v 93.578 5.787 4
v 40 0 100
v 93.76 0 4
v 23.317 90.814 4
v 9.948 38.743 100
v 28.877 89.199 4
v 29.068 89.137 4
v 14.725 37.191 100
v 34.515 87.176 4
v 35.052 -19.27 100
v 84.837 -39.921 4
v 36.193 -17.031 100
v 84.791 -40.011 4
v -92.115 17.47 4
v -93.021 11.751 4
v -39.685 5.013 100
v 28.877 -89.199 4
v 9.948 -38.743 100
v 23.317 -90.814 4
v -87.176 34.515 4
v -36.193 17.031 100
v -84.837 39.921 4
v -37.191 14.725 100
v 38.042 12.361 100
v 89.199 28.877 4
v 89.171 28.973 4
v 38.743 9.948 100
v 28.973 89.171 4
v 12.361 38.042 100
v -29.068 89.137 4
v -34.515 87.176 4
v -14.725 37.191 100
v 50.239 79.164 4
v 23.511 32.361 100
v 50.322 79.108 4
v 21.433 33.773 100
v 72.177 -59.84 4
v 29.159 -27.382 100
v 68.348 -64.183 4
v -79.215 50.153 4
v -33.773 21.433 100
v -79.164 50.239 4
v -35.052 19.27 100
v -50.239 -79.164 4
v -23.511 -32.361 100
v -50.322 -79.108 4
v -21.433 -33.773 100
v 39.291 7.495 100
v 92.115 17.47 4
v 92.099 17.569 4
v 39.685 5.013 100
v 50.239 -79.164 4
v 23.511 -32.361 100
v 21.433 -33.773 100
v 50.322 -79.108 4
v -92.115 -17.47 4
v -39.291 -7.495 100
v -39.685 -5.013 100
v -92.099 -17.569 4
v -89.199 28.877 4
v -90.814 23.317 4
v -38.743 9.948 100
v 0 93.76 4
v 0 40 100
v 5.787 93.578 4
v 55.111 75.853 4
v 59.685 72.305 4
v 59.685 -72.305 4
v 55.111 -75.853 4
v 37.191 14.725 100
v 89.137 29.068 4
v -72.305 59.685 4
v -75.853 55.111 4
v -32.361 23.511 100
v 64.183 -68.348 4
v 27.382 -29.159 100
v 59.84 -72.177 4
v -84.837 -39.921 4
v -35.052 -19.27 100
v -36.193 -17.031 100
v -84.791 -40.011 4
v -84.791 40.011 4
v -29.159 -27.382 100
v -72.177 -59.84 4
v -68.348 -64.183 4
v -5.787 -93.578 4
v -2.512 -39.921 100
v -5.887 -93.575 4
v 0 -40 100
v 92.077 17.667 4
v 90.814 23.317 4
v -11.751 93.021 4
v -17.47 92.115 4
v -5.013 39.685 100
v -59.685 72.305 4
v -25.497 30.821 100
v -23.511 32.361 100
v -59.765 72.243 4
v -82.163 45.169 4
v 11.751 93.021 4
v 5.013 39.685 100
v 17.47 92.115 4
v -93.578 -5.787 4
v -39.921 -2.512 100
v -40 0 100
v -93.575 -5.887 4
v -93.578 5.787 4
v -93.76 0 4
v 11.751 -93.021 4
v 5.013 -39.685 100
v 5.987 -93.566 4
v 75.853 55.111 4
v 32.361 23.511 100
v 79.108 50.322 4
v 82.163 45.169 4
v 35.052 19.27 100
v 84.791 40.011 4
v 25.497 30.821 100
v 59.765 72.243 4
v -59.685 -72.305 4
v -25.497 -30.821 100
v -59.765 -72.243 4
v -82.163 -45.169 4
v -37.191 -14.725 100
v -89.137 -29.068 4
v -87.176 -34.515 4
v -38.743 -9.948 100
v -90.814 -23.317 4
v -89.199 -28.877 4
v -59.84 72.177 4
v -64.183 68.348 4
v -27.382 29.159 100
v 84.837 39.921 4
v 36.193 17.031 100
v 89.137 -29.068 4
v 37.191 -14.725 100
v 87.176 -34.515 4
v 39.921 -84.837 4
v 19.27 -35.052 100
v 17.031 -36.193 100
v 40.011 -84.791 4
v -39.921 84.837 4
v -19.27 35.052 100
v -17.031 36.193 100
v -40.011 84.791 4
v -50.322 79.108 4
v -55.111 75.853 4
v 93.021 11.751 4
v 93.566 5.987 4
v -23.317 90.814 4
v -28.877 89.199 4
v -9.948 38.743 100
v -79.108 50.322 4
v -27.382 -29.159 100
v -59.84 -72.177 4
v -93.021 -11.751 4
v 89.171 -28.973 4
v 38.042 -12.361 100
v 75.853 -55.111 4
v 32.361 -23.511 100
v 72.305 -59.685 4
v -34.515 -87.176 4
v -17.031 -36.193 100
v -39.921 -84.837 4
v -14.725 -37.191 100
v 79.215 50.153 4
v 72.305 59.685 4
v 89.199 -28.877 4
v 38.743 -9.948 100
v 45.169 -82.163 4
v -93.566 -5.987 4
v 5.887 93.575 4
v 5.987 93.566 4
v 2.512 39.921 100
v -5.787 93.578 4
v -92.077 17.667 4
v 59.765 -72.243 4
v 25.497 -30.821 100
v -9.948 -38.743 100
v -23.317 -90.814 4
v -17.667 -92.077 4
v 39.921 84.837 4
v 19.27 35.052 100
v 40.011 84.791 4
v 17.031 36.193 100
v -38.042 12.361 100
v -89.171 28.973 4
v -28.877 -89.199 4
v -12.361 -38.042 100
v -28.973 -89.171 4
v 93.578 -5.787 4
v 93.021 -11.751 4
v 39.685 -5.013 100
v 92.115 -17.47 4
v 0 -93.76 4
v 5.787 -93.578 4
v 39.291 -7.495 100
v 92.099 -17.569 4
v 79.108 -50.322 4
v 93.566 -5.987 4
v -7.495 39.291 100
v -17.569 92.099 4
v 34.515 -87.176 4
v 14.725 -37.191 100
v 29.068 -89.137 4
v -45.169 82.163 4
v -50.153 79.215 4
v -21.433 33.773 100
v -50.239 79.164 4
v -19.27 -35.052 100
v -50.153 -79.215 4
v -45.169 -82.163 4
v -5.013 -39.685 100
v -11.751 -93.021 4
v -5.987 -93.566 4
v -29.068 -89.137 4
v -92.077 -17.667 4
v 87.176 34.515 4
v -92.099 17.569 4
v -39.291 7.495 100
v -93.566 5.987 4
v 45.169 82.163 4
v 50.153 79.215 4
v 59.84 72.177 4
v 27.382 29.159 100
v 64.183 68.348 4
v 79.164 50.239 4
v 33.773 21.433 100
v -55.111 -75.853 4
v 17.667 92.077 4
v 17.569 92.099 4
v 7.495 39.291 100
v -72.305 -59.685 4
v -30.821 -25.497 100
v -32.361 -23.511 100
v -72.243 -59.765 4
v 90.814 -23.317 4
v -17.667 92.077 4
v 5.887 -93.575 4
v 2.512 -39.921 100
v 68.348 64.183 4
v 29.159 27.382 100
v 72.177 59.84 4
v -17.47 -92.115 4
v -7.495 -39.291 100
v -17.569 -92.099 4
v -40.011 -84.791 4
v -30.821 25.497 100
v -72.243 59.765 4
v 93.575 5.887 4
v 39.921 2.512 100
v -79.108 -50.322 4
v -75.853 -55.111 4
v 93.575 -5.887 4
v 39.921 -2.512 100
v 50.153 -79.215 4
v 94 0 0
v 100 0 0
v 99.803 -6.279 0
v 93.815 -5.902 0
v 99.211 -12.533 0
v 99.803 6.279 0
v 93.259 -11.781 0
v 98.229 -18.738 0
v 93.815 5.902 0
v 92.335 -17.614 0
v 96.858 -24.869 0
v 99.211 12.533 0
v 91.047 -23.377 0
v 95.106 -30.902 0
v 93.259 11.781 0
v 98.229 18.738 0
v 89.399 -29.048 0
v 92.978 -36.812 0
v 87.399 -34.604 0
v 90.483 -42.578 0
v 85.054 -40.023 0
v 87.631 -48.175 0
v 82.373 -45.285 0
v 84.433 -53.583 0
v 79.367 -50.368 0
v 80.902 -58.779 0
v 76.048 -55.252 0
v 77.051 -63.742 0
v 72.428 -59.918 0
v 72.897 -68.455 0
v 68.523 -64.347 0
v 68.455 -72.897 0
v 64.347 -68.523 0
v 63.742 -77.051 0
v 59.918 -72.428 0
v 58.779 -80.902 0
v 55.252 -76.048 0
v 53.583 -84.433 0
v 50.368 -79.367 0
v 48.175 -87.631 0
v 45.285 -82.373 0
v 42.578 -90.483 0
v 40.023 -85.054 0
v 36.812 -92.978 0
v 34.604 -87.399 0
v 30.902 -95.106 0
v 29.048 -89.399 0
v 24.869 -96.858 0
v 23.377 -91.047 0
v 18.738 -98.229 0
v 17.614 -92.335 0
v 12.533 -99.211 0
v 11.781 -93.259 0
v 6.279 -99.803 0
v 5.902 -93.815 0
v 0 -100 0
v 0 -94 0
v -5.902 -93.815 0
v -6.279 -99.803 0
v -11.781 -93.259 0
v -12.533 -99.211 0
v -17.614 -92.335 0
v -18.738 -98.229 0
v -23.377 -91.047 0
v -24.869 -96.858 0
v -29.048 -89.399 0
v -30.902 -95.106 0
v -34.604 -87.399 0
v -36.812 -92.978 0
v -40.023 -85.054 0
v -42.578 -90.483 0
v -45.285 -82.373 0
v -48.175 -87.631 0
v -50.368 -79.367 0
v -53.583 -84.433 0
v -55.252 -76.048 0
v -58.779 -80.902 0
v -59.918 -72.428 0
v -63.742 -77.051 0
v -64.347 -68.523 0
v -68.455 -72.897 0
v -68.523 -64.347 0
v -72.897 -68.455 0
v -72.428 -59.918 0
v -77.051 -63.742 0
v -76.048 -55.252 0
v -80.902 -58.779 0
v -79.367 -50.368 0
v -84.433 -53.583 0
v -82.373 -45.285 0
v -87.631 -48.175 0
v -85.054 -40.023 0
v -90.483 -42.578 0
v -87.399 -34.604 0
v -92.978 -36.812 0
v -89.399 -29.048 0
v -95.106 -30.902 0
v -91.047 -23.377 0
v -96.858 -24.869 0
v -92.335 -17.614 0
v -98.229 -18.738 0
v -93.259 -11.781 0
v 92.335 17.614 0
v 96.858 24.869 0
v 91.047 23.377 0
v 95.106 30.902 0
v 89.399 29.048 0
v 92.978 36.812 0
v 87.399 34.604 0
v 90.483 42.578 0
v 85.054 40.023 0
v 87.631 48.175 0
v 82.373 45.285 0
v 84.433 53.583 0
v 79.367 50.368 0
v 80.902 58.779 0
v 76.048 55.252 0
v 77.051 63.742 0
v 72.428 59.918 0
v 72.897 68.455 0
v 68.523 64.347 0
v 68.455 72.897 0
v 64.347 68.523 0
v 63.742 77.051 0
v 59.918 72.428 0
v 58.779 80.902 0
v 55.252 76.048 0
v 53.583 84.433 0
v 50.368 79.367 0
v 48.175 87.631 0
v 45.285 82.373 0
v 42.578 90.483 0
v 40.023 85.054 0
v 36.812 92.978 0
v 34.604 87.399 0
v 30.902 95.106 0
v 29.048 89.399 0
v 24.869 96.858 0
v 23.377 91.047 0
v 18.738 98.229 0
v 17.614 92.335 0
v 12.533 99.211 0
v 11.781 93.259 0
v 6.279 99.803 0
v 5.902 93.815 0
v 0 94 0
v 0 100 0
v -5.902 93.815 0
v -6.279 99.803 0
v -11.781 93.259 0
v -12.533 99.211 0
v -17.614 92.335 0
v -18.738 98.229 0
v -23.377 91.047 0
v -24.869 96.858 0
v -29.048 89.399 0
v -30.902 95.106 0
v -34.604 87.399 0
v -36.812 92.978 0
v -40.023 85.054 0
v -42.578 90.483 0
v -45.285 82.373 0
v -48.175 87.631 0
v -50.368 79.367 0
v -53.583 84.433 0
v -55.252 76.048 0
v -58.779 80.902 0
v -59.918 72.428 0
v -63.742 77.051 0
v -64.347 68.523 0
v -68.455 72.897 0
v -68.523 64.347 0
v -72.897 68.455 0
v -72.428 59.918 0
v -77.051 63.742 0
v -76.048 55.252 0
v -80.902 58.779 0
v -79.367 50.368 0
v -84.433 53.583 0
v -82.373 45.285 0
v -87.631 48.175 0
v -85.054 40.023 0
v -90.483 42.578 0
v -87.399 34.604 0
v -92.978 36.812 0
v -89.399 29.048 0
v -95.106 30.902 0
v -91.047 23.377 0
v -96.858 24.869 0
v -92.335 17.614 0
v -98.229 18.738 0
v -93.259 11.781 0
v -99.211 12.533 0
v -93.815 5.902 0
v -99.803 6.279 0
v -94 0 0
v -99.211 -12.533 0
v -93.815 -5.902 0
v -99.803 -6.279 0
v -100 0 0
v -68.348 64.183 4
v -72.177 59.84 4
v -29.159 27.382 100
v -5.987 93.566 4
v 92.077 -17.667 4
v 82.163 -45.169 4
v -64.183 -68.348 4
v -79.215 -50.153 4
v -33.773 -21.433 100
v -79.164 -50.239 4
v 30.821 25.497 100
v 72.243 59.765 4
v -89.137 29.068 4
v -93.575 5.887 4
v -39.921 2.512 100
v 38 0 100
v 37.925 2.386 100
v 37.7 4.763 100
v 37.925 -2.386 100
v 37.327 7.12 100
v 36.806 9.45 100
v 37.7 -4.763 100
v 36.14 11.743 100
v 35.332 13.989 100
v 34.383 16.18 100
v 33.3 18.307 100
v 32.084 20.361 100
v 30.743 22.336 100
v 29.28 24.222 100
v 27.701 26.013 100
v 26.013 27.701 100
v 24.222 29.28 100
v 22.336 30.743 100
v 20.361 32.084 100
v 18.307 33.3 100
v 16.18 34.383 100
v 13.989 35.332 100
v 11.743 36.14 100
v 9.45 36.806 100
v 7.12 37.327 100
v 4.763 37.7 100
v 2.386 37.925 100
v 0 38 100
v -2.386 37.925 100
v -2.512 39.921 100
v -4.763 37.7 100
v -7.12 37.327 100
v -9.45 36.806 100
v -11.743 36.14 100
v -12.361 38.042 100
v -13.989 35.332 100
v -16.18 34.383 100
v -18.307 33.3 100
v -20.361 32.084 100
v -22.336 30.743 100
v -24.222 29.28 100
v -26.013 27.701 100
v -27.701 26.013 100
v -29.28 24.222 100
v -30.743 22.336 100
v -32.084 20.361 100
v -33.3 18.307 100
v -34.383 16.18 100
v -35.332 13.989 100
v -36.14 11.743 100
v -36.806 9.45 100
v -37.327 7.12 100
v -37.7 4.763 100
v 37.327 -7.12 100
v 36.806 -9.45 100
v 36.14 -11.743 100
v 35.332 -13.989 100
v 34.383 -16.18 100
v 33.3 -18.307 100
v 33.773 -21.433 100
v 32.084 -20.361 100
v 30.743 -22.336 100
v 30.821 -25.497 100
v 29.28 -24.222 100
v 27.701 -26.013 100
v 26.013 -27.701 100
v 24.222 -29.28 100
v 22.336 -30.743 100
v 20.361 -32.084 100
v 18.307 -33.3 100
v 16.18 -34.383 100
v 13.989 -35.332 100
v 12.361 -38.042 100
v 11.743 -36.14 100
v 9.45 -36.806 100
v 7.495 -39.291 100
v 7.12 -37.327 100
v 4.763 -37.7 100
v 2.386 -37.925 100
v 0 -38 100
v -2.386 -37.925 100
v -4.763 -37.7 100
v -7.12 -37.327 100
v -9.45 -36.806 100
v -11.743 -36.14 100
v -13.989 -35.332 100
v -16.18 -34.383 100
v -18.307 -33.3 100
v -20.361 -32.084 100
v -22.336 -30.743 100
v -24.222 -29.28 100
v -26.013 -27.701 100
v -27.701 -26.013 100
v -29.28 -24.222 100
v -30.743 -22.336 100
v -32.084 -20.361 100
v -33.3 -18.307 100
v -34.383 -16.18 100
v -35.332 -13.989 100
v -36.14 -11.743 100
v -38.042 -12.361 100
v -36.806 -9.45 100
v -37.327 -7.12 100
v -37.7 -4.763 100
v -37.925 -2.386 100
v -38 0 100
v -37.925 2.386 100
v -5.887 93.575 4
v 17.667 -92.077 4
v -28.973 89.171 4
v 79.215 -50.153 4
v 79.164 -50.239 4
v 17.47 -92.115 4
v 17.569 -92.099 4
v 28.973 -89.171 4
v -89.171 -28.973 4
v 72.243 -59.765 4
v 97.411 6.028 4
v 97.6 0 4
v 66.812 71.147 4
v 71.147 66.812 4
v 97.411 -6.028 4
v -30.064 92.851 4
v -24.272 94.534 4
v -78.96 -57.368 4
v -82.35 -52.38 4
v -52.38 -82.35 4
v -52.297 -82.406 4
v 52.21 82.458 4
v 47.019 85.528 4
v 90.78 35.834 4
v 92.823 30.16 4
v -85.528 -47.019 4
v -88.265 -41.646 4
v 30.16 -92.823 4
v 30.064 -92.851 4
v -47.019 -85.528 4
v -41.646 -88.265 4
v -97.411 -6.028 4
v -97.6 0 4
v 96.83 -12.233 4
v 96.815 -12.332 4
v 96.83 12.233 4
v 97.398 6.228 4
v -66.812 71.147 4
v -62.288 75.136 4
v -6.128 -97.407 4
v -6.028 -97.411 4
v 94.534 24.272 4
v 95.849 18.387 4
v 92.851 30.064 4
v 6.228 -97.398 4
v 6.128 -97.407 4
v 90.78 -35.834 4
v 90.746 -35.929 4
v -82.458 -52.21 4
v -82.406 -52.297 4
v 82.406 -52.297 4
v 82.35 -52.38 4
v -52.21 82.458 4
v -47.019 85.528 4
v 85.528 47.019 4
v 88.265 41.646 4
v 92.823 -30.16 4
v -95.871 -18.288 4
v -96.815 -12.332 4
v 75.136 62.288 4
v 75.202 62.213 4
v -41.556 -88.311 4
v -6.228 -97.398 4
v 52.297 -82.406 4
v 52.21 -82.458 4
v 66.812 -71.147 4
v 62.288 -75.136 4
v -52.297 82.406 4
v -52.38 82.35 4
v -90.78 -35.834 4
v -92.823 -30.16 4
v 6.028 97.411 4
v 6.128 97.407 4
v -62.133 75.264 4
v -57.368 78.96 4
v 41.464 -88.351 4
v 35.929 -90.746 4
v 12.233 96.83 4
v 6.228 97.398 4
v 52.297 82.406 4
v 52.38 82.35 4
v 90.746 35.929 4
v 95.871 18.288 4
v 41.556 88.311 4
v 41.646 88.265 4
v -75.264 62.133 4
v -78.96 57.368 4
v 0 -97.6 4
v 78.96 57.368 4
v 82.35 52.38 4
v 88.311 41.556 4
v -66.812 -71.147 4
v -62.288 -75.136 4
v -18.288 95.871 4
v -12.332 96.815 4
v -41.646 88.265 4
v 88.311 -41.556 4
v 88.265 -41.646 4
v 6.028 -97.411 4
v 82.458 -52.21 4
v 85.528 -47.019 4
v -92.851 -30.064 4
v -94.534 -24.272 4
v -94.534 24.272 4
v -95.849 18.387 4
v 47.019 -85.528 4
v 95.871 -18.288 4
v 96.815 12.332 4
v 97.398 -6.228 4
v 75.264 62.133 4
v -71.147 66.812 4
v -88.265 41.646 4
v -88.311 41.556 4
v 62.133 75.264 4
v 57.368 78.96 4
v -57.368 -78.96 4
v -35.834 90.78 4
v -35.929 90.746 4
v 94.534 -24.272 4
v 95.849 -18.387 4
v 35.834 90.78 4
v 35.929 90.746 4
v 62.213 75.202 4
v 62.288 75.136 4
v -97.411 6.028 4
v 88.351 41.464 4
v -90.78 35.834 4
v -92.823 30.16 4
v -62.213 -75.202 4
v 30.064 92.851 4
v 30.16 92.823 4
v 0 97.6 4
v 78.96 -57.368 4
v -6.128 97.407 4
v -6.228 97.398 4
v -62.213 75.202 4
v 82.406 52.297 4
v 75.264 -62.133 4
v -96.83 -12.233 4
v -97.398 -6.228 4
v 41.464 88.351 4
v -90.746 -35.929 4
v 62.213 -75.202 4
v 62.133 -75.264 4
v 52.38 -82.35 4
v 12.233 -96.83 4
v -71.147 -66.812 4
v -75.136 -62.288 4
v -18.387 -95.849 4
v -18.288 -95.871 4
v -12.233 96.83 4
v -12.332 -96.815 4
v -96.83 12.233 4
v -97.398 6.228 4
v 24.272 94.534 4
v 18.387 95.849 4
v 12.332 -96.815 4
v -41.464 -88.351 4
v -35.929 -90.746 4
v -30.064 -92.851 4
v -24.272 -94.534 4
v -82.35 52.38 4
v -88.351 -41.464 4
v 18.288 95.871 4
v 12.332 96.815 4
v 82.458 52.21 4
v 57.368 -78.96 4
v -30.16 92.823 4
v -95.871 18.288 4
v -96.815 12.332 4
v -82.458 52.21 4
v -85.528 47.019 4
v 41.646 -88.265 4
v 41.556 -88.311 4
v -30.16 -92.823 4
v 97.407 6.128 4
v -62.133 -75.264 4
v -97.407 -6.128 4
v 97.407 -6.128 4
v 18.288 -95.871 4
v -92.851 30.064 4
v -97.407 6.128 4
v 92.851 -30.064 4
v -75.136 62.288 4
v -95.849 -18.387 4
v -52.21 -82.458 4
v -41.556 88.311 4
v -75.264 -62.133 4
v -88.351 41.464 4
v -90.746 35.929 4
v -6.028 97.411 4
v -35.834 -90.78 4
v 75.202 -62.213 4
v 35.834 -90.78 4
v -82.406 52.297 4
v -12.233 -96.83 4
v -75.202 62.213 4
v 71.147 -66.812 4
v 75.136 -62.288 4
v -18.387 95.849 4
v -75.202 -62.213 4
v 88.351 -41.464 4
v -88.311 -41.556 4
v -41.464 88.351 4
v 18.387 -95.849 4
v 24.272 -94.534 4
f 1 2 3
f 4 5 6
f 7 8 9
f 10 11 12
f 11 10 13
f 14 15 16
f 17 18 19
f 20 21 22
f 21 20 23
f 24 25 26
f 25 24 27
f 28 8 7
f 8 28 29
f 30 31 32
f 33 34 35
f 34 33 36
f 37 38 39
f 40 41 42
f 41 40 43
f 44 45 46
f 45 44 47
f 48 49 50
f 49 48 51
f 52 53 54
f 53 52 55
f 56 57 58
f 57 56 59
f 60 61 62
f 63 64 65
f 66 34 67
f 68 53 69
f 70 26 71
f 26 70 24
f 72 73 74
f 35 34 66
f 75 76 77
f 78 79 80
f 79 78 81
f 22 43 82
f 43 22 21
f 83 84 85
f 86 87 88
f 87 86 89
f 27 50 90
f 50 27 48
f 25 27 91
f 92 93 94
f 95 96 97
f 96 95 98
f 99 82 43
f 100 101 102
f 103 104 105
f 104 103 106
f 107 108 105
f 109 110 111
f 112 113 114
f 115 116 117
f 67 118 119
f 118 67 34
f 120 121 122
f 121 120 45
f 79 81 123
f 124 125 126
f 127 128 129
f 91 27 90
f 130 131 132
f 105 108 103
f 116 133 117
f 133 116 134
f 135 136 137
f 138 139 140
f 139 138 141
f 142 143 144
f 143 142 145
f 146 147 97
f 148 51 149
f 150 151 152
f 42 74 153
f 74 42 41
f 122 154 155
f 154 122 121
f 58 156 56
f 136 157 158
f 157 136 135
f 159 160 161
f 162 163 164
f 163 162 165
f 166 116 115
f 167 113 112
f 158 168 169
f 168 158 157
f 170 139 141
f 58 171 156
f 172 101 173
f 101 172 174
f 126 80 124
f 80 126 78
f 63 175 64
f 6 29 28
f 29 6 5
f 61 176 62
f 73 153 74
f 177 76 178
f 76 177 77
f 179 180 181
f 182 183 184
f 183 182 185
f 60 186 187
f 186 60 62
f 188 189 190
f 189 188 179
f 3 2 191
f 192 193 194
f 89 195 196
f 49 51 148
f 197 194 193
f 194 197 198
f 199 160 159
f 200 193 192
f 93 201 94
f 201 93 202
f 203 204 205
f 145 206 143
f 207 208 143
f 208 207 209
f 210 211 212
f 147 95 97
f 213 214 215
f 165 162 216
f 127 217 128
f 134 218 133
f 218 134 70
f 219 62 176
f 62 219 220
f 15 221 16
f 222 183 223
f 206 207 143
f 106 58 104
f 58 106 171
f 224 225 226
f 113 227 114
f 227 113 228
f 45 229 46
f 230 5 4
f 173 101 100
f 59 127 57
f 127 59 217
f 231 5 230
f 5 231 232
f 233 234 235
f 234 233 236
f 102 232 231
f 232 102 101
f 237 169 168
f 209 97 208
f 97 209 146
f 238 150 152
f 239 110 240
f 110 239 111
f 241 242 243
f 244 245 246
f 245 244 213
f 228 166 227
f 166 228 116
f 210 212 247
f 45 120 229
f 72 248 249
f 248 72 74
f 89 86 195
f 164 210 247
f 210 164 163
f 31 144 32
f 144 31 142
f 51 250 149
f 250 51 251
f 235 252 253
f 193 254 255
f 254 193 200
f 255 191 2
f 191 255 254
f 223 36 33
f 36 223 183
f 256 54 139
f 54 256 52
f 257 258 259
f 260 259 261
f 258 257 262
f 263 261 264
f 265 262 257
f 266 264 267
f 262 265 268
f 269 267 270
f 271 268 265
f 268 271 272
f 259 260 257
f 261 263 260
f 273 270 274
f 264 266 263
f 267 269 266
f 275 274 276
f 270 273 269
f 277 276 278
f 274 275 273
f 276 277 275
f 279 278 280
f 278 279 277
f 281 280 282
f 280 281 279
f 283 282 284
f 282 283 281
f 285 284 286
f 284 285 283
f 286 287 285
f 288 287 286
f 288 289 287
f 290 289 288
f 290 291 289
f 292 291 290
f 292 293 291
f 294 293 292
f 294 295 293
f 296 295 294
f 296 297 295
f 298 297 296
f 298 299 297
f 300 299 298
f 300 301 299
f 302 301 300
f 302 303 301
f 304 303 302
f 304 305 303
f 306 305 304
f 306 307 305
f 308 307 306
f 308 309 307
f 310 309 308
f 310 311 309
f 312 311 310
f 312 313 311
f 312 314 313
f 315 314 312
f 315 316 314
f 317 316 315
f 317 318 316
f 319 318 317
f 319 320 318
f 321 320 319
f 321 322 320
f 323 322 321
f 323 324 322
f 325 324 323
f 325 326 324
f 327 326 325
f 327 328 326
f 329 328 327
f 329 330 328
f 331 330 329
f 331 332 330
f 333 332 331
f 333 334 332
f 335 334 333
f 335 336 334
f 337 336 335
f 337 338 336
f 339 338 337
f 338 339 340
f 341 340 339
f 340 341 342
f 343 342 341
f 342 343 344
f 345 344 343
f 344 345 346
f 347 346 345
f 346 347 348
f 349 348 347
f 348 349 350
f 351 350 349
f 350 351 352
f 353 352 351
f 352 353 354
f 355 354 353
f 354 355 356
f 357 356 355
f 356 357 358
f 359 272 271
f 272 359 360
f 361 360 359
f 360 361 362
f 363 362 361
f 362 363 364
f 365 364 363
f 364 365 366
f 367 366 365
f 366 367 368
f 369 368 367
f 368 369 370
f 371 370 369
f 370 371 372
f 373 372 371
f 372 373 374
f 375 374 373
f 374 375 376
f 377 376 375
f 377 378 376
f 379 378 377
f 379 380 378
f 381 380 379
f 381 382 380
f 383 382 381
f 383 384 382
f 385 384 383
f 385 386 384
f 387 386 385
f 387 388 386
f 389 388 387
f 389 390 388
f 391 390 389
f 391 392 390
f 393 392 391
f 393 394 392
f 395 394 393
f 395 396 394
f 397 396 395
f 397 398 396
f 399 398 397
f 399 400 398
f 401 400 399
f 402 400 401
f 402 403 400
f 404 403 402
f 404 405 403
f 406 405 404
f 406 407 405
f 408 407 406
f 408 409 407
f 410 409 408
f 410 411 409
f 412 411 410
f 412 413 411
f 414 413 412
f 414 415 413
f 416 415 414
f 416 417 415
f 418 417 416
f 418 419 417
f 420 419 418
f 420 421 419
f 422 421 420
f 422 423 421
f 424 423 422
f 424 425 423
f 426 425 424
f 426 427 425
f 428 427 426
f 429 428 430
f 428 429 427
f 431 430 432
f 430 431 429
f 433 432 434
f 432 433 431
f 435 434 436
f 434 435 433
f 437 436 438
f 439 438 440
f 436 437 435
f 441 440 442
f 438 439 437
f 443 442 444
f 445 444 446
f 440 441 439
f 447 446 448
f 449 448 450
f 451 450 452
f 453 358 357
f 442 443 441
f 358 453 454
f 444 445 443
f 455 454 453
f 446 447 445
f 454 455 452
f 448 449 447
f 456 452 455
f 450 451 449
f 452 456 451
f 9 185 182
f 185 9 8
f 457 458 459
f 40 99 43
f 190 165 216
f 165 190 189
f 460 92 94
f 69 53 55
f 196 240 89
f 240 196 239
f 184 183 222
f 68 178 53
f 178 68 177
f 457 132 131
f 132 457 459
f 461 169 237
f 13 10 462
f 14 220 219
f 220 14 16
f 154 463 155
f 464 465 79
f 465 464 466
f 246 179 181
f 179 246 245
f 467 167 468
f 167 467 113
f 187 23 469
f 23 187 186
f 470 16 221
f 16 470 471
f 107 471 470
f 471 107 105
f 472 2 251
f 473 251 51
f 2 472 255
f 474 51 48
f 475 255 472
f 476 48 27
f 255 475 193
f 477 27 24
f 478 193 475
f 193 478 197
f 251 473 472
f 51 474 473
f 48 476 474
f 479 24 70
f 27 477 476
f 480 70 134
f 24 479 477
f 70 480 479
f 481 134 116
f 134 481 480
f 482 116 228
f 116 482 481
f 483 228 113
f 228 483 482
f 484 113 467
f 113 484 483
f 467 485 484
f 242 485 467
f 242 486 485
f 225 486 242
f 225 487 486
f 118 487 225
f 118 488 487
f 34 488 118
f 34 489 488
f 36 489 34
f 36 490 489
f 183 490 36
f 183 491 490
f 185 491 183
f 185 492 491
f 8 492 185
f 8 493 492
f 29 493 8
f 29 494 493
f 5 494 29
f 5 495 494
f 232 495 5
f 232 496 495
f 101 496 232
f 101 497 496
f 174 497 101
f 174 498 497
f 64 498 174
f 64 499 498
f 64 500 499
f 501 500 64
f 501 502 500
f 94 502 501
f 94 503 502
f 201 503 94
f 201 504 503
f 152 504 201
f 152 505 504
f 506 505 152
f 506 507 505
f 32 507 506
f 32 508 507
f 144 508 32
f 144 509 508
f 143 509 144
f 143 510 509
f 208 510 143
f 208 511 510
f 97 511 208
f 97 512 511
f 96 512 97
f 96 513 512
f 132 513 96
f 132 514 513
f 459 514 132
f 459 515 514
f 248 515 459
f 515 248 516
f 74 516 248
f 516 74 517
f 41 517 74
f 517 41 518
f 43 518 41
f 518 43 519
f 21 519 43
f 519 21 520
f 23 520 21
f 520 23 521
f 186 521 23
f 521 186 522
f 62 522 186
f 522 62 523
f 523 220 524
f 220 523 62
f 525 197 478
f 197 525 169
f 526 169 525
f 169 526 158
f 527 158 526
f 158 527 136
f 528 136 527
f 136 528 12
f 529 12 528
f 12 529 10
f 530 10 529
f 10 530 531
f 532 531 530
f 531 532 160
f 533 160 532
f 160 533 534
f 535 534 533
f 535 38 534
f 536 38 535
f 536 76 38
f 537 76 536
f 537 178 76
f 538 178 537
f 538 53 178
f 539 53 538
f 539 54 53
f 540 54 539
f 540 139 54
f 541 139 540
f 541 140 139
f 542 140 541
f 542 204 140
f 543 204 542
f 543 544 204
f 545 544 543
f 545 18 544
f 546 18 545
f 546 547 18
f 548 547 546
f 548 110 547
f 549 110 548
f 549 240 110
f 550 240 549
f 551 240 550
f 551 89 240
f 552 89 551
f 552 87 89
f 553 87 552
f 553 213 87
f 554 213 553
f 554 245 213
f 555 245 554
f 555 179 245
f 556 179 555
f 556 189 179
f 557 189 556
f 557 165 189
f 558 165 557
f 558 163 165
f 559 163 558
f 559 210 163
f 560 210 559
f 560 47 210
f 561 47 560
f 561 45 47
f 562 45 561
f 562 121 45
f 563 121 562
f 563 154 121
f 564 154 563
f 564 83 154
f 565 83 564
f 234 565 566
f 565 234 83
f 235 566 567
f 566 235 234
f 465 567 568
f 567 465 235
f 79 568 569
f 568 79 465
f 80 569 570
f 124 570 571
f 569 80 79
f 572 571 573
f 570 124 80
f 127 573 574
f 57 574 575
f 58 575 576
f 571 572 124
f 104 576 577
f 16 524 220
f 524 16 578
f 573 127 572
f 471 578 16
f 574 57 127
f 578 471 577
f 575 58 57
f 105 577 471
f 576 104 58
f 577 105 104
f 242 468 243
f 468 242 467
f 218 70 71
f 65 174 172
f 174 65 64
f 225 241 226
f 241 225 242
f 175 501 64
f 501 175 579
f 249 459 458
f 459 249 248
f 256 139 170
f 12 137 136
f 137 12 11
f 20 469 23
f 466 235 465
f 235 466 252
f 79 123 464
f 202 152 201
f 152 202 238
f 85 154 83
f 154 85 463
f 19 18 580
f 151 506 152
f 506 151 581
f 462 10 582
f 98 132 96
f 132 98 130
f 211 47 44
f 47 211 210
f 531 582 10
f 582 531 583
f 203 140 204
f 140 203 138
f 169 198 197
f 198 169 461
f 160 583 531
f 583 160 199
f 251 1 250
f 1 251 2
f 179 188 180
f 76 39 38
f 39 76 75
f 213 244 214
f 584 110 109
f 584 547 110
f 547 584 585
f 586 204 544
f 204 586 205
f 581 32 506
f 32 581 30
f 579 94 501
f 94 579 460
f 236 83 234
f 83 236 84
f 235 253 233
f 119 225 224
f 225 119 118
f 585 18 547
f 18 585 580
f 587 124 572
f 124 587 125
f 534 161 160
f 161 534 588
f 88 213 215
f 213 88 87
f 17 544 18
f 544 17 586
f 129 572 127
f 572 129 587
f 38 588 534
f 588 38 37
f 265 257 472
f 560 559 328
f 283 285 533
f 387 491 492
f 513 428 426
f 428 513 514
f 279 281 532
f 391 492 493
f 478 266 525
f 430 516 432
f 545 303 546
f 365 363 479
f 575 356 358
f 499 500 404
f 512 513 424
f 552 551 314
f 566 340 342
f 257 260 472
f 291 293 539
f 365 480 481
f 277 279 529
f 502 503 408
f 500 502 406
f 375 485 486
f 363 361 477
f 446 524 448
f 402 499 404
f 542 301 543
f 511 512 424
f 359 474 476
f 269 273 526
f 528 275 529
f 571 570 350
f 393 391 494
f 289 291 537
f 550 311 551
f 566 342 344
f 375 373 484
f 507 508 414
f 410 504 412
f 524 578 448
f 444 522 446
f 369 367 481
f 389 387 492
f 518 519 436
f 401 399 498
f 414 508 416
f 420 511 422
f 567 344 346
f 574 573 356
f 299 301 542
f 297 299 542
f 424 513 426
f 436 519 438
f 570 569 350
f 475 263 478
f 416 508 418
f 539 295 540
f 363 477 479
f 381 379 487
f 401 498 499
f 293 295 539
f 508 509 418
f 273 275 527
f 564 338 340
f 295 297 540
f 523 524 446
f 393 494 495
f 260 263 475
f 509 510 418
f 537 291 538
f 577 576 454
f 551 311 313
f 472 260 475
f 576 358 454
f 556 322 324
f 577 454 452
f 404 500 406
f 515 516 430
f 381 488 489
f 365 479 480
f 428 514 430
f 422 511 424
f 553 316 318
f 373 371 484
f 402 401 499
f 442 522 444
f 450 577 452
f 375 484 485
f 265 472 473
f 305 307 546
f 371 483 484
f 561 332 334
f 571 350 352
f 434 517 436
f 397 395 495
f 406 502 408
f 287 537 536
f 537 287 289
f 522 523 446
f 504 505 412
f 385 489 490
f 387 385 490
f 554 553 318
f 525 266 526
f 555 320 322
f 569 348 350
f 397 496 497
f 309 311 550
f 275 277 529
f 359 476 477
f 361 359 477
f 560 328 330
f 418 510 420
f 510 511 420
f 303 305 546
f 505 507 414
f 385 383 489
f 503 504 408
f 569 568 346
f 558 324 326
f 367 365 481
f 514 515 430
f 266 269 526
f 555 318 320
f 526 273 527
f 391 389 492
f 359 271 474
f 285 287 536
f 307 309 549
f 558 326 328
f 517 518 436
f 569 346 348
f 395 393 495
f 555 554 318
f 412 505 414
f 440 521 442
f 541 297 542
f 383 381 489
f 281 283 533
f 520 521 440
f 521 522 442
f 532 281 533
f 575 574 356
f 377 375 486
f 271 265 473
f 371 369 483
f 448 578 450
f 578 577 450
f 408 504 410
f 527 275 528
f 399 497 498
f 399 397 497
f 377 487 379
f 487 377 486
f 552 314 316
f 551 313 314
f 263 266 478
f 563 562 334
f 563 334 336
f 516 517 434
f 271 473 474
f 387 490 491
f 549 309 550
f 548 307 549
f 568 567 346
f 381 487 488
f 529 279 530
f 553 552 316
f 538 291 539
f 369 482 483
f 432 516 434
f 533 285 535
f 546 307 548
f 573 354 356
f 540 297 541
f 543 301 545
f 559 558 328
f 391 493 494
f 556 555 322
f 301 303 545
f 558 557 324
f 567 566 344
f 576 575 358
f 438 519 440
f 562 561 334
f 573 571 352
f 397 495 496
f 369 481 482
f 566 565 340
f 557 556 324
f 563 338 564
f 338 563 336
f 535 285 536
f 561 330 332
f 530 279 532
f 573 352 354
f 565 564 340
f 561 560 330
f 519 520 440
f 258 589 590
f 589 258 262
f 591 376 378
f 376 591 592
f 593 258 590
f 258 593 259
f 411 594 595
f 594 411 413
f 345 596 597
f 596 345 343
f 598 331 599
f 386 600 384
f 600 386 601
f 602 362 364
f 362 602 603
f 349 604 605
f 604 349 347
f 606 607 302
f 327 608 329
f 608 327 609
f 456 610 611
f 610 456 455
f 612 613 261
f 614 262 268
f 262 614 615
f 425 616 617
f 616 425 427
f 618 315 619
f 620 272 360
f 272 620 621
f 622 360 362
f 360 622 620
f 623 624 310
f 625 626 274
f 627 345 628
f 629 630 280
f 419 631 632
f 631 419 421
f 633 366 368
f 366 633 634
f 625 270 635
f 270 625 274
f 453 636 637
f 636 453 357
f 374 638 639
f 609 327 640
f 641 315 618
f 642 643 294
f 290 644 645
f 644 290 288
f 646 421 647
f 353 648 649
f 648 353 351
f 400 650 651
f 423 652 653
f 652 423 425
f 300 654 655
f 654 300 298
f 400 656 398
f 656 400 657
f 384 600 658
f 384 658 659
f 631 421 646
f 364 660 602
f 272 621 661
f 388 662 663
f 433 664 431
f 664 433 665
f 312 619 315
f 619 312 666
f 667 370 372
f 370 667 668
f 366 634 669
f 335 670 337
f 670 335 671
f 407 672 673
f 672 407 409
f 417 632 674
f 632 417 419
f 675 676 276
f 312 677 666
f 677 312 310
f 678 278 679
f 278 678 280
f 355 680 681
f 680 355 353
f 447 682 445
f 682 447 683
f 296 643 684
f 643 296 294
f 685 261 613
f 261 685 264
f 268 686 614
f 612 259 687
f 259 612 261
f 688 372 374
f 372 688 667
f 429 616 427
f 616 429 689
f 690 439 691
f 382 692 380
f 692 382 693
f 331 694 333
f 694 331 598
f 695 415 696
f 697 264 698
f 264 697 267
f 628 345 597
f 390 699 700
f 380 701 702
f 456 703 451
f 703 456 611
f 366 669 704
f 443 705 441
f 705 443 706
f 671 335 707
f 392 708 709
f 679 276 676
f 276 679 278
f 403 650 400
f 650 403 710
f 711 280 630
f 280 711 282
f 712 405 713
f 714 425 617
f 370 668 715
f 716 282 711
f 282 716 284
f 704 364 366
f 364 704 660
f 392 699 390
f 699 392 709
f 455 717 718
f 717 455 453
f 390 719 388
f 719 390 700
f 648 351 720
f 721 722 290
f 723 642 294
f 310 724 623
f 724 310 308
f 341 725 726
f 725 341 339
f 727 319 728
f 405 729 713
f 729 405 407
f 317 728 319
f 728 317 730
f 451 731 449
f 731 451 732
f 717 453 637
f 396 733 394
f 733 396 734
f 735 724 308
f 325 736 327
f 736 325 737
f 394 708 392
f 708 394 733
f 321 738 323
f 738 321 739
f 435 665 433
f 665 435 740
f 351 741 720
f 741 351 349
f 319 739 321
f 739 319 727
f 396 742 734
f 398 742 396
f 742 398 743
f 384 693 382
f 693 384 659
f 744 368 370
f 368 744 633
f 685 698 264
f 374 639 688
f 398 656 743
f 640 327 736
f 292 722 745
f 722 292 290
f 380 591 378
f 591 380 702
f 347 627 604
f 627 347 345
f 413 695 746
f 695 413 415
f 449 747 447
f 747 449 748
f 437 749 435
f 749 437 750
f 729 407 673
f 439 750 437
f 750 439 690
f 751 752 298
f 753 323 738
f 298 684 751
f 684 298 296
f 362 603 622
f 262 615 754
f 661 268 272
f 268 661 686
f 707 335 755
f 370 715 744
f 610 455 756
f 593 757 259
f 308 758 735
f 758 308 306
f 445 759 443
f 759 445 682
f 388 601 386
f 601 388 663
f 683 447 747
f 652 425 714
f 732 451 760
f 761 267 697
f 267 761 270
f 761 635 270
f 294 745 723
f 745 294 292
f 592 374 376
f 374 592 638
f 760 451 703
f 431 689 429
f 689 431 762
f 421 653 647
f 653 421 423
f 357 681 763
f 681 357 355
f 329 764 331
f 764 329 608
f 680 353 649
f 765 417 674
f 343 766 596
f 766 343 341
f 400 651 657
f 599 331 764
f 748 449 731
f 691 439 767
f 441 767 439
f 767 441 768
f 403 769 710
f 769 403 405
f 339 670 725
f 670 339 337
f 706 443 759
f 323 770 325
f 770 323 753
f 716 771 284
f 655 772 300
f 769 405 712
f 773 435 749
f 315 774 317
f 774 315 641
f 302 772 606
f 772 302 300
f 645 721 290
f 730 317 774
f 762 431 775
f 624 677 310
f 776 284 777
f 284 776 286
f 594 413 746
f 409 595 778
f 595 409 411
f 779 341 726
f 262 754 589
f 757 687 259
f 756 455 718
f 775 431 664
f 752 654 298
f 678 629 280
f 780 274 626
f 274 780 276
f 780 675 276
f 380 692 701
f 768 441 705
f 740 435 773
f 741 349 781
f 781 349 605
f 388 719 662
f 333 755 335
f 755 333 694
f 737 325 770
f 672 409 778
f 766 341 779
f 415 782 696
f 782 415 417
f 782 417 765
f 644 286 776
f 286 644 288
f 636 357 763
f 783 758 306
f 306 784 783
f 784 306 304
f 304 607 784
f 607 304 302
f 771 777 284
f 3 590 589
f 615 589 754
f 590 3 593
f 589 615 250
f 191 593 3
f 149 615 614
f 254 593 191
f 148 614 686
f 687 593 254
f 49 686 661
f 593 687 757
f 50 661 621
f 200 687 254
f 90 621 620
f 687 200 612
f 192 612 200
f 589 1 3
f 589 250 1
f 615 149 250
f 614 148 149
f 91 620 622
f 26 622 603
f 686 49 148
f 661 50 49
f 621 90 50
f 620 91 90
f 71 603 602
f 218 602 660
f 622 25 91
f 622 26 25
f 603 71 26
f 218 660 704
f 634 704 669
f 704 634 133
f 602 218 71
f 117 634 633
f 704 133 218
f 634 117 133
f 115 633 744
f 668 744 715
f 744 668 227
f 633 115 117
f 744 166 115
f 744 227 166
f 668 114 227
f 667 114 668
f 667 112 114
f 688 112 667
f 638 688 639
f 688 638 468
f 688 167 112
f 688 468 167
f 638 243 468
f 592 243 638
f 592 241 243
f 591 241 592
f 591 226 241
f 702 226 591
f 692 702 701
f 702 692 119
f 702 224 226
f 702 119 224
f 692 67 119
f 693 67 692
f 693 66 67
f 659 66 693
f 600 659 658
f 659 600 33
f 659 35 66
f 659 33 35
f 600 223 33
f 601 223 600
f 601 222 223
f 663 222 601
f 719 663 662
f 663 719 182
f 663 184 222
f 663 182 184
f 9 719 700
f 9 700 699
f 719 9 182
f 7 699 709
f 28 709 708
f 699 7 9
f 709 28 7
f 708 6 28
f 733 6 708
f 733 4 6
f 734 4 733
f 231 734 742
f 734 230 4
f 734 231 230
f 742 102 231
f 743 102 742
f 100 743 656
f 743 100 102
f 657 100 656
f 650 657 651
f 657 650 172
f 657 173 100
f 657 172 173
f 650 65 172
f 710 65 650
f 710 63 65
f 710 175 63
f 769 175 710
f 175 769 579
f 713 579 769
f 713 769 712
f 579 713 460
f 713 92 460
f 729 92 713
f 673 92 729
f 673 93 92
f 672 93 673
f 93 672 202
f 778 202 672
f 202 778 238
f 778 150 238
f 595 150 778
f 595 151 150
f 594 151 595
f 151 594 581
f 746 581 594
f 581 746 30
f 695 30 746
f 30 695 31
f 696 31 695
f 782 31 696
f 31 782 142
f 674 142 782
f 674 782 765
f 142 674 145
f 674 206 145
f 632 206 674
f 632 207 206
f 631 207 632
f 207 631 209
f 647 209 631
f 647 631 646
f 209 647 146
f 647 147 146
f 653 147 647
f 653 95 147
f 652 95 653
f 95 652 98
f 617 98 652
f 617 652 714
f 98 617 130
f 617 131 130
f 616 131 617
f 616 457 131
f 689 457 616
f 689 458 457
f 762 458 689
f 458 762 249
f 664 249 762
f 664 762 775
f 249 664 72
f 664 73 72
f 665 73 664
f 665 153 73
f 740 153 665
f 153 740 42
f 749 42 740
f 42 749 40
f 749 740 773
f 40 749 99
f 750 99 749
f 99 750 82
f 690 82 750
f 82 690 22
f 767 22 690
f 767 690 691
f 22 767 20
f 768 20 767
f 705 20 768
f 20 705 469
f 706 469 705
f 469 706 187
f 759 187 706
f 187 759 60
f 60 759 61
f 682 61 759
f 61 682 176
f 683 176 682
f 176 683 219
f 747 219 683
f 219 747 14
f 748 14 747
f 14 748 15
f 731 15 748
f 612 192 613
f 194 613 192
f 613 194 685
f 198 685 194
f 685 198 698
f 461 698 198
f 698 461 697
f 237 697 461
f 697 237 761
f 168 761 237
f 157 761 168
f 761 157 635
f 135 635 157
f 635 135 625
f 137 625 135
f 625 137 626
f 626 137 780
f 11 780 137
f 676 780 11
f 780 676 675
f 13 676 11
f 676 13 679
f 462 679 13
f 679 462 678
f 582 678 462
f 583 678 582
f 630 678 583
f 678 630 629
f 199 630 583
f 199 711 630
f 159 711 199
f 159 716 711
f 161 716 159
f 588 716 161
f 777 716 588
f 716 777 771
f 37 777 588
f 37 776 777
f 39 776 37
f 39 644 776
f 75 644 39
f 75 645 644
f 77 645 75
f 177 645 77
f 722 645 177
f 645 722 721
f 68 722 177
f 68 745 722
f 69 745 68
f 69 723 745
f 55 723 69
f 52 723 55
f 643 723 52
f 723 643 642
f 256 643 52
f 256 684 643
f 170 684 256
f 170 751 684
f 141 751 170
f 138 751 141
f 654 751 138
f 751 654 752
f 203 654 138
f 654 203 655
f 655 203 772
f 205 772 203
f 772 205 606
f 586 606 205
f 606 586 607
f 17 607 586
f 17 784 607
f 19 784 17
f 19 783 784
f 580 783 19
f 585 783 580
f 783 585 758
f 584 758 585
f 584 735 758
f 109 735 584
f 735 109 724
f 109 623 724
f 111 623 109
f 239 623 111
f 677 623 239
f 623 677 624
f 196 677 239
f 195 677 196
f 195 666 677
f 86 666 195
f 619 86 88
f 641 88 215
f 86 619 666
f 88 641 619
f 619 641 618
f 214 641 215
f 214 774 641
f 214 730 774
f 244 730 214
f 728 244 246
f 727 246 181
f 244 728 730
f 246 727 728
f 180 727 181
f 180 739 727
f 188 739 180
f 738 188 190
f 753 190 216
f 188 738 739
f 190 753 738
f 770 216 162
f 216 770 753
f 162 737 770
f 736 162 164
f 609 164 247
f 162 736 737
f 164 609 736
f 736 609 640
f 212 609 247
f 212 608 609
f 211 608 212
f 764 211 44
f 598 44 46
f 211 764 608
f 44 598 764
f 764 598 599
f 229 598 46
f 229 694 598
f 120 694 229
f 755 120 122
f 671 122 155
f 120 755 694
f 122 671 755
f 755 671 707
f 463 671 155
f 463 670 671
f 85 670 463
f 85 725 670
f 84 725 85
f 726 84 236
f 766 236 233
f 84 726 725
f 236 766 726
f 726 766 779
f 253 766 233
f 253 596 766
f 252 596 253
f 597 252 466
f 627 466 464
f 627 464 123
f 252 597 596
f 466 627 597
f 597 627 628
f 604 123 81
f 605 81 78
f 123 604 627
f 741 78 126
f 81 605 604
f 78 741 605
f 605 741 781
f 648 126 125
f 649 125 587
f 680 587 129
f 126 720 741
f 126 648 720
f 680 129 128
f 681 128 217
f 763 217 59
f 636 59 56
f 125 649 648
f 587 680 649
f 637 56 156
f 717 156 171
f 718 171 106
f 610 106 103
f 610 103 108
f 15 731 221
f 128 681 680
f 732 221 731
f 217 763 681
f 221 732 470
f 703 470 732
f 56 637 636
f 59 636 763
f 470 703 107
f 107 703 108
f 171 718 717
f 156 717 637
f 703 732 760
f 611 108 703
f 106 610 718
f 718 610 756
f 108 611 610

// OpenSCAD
// Outer diamater of the hole funnel should fit in.
outerDiameter = 200;

// Hole at the bottom of the funnel. Typically smaller then you overflow cup below.
drainHoleDiameter = 80;

// Thickness of the main body
wallThinkness = 4;

// Thickiness of the upper rim
rimThinkness = 4;

// Width of the rim (also how far should the cone start from the edge of the rim)
rimWidth = 4;

// Height of the funnel
height = 100;

module drain_funnel(){
  $fn=100;

  difference() {
    cylinder(h=height, d1=outerDiameter-rimWidth*2, d2=drainHoleDiameter);
    cylinder(h=height, d1=outerDiameter-rimWidth*2-wallThinkness, d2=drainHoleDiameter-wallThinkness);
  }
  difference() {
    cylinder(h=height, d1=outerDiameter, d2=drainHoleDiameter);
    cylinder(h=height, d1=outerDiameter-8, d2=drainHoleDiameter-wallThinkness);
    translate([0,0,height/2+rimThinkness]) cube([outerDiameter*2,outerDiameter*2,height], center=true);
  }
}

drain_funnel();
